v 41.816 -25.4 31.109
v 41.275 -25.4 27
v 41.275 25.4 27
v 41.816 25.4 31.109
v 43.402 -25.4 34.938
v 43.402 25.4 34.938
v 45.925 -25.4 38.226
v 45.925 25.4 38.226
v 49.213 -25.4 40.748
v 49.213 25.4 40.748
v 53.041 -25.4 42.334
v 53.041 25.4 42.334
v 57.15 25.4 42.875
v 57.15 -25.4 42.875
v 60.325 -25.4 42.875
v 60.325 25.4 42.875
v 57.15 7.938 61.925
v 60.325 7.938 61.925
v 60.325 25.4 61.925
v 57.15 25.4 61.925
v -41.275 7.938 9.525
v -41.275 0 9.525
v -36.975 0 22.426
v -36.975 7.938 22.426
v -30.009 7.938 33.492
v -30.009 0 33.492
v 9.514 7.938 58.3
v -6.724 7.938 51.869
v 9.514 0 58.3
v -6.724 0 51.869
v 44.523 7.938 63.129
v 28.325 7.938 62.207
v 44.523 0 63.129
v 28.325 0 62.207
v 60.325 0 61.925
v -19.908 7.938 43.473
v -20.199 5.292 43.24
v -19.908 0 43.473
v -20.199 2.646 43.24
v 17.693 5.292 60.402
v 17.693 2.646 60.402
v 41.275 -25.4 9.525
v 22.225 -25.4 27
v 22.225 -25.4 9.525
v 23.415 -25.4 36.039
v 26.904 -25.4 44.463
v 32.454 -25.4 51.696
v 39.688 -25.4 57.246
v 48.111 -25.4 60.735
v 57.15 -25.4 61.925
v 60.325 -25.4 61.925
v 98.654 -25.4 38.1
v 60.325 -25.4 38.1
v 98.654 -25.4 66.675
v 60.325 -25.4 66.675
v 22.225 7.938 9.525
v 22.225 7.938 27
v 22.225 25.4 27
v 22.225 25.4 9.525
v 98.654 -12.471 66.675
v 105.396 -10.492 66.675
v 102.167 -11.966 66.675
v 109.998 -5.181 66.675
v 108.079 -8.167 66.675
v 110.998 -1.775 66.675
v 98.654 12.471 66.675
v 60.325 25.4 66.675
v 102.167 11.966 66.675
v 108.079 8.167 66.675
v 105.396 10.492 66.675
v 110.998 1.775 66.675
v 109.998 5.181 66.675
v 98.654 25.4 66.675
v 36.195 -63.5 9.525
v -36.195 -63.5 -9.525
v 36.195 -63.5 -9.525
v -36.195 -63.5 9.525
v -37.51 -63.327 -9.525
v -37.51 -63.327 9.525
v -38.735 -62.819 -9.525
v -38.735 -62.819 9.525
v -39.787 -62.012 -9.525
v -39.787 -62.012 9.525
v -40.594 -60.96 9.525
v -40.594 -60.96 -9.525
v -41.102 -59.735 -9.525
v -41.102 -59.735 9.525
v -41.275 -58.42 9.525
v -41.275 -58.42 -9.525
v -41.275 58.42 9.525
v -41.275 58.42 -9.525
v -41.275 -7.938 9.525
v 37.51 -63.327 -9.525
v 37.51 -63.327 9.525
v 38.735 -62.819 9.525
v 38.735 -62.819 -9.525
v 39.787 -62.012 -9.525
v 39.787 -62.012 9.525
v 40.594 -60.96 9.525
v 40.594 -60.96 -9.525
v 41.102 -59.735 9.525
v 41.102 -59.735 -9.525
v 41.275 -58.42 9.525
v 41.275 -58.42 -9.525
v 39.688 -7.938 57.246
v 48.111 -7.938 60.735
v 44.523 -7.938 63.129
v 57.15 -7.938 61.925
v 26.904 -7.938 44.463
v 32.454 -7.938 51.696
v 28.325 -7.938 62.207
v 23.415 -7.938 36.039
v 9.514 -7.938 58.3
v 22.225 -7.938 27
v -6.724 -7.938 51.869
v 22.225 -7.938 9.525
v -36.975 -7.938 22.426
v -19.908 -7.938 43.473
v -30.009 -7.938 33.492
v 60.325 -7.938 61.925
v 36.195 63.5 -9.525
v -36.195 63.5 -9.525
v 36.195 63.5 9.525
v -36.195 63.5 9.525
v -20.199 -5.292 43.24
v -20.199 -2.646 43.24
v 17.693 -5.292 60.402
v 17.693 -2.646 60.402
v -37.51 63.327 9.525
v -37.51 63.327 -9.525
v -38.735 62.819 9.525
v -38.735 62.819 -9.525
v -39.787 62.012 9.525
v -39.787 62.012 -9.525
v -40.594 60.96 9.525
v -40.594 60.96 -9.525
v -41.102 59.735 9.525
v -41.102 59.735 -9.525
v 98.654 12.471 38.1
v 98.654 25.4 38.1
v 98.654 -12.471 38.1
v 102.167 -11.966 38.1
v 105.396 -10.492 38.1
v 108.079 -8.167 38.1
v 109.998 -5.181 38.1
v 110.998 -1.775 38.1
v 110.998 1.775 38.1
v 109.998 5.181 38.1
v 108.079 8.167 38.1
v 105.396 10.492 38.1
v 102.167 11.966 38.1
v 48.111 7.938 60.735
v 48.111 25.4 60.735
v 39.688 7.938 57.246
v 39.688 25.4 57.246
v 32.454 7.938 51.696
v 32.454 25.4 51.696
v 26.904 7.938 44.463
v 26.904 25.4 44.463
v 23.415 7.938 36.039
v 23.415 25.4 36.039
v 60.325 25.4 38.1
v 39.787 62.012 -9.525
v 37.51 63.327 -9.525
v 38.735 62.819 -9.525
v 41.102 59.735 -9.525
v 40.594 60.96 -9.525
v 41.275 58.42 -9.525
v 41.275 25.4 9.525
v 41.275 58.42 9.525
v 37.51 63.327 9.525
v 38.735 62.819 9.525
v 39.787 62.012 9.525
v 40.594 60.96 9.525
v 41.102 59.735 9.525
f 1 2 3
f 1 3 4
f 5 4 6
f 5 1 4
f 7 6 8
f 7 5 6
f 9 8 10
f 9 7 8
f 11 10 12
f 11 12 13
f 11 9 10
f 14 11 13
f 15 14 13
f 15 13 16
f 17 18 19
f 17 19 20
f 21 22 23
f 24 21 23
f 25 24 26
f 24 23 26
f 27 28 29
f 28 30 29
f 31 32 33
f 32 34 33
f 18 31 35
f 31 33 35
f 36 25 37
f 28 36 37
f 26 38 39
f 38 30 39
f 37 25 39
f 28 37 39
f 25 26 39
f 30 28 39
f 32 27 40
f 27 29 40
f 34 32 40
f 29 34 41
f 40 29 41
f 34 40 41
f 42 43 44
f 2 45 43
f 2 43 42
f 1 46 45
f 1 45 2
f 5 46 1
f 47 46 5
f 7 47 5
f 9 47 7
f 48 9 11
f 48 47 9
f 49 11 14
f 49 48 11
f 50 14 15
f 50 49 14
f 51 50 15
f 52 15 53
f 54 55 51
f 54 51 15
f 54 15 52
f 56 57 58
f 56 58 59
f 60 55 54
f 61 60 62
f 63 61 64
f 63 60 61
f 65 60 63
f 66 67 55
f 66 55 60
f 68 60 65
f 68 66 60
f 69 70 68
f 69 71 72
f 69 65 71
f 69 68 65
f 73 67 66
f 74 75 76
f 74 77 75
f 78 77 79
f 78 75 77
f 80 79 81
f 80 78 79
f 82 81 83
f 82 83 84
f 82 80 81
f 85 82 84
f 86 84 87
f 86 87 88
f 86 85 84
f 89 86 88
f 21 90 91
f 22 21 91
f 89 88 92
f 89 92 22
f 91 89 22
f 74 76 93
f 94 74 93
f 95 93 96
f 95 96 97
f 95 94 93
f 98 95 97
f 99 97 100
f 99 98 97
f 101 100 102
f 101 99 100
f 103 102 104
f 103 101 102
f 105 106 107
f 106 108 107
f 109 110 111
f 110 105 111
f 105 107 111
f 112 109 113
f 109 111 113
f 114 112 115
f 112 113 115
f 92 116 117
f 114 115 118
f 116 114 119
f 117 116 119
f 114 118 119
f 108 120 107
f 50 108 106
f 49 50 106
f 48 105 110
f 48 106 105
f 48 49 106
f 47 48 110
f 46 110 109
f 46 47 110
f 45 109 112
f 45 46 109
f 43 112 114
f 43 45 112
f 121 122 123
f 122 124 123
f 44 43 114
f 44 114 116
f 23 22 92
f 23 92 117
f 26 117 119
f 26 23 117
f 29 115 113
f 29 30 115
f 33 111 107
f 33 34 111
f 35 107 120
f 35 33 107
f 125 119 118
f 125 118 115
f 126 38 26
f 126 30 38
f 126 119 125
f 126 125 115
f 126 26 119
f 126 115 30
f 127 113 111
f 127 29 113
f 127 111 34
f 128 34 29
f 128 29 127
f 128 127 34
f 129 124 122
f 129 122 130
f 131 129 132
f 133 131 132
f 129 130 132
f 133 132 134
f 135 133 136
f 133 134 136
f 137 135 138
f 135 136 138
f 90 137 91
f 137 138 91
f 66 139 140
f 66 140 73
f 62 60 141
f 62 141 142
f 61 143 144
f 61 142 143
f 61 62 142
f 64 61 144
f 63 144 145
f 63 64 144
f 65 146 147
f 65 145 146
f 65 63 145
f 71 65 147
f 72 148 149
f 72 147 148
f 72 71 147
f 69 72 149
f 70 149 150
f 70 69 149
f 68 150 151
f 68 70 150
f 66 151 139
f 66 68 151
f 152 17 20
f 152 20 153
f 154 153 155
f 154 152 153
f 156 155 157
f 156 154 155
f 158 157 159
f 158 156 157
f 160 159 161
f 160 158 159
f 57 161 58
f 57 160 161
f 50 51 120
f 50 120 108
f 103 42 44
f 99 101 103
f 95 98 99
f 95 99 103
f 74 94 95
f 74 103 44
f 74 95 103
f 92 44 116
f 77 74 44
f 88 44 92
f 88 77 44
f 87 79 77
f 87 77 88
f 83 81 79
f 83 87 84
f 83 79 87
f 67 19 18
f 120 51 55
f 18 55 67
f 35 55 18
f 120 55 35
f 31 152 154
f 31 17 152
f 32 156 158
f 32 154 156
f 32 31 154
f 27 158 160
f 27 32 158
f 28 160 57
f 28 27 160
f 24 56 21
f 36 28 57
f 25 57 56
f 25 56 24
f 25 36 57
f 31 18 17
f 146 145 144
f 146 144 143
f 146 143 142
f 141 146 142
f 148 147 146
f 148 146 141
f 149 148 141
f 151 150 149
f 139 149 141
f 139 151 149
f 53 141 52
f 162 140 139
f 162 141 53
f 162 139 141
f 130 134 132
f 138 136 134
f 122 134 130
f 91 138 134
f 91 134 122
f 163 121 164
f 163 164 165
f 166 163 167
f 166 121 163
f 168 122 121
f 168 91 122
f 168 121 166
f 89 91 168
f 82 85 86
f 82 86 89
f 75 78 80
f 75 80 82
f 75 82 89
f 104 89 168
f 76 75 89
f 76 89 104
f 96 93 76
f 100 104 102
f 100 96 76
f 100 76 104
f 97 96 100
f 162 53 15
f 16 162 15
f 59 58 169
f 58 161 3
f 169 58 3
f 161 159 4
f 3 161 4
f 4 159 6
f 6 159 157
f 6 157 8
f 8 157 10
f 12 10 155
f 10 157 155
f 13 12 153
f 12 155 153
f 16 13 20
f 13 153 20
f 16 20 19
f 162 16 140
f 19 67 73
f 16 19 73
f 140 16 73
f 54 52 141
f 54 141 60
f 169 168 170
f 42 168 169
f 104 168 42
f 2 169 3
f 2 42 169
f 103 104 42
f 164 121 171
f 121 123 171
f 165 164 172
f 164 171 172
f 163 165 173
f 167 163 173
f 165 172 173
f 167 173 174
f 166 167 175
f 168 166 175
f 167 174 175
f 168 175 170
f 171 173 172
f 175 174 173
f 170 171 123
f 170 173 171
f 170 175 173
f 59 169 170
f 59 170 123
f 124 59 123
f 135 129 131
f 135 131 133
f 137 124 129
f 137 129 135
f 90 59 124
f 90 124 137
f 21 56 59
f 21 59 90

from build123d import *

# Parameters (mm, degrees)
F1_DEPTH = 63.5
F0_W     = 38.328622
F0_H     = 4.7498
F0_H_2   = 4.7752
F0_H_3   = 19.05
F2_DEPTH = 25.4
F3_DEPTH = 7.9375
F5_R     = 5.08


with BuildPart() as f1:
    # F0 (on Front) → F1 (new body, symmetric)
    with BuildSketch(Plane.XZ):
        Polygon((22.225, 9.525), (-41.275, 9.525), (-41.275, -9.525), (41.275, -9.525), (41.275, 9.525), align=None)
    extrude(amount=F1_DEPTH, both=True)

    # F0 (on Front) → F2 (join, symmetric)
    with BuildSketch(Plane.XZ):
        Polygon((22.225, 9.525), (-41.275, 9.525), (-41.275, -9.525), (41.275, -9.525), (41.275, 9.525), align=None)
        with Locations((79.489311, 64.3001)):
            Rectangle(F0_W, F0_H)
        with Locations((79.489311, 40.4876)):
            Rectangle(F0_W, F0_H_2)
        with BuildLine():
            Line((22.225, 27.0002), (22.225, 9.525))
            Line((22.225, 9.525), (41.275, 9.525))
            Line((41.275, 9.525), (41.275, 27.0002))
            ThreePointArc((41.275, 27.0002), (45.92468, 38.22552), (57.15, 42.8752))
            Line((57.15, 42.8752), (60.325, 42.8752))
            Line((60.325, 42.8752), (60.325, 61.9252))
            Line((60.325, 61.9252), (57.15, 61.9252))
            ThreePointArc((57.15, 61.9252), (32.454296, 51.695904), (22.225, 27.0002))
        make_face()
        with Locations((79.489311, 52.4002)):
            Rectangle(F0_W, F0_H_3)
    extrude(amount=F2_DEPTH, both=True)

    # F0 (on Front) → F3 (join, symmetric)
    with BuildSketch(Plane.XZ):
        with BuildLine():
            add(Edge.make_bspline(
                [(-41.275, 9.525), (-32.633623, 51.821707), (19.34902, 67.917436), (60.325, 61.9252)],
                knots=[0, 0, 0, 0, 114.316845, 114.316845, 114.316845, 114.316845], degree=3))
            Line((-41.275, 9.525), (22.225, 9.525))
            Line((22.225, 9.525), (22.225, 27.0002))
            ThreePointArc((22.225, 27.0002), (32.454296, 51.695904), (57.15, 61.9252))
            Line((57.15, 61.9252), (60.325, 61.9252))
        make_face()
    extrude(amount=F3_DEPTH, both=True)

    # F0 (on Front) → F4 (revolve)
    with BuildSketch(Plane.XZ):
        Polygon((98.653622, 66.675), (98.653622, 61.9252), (98.653622, 42.8752), (98.653622, 38.1), (111.125, 38.1), (111.125, 66.675), align=None)
    revolve(axis=Axis((98.653622, 0, 52.3875), (0, 0, 1)))

    # F5
    f5_edges = [f1.edges().sort_by_distance(p)[0] for p in [
        (-41.275, -63.5, 0),
        (41.275, -63.5, 0),
        (41.275, 63.5, 0),
        (-41.275, 63.5, 0),
    ]]
    fillet(f5_edges, radius=F5_R)


solid = f1.part
